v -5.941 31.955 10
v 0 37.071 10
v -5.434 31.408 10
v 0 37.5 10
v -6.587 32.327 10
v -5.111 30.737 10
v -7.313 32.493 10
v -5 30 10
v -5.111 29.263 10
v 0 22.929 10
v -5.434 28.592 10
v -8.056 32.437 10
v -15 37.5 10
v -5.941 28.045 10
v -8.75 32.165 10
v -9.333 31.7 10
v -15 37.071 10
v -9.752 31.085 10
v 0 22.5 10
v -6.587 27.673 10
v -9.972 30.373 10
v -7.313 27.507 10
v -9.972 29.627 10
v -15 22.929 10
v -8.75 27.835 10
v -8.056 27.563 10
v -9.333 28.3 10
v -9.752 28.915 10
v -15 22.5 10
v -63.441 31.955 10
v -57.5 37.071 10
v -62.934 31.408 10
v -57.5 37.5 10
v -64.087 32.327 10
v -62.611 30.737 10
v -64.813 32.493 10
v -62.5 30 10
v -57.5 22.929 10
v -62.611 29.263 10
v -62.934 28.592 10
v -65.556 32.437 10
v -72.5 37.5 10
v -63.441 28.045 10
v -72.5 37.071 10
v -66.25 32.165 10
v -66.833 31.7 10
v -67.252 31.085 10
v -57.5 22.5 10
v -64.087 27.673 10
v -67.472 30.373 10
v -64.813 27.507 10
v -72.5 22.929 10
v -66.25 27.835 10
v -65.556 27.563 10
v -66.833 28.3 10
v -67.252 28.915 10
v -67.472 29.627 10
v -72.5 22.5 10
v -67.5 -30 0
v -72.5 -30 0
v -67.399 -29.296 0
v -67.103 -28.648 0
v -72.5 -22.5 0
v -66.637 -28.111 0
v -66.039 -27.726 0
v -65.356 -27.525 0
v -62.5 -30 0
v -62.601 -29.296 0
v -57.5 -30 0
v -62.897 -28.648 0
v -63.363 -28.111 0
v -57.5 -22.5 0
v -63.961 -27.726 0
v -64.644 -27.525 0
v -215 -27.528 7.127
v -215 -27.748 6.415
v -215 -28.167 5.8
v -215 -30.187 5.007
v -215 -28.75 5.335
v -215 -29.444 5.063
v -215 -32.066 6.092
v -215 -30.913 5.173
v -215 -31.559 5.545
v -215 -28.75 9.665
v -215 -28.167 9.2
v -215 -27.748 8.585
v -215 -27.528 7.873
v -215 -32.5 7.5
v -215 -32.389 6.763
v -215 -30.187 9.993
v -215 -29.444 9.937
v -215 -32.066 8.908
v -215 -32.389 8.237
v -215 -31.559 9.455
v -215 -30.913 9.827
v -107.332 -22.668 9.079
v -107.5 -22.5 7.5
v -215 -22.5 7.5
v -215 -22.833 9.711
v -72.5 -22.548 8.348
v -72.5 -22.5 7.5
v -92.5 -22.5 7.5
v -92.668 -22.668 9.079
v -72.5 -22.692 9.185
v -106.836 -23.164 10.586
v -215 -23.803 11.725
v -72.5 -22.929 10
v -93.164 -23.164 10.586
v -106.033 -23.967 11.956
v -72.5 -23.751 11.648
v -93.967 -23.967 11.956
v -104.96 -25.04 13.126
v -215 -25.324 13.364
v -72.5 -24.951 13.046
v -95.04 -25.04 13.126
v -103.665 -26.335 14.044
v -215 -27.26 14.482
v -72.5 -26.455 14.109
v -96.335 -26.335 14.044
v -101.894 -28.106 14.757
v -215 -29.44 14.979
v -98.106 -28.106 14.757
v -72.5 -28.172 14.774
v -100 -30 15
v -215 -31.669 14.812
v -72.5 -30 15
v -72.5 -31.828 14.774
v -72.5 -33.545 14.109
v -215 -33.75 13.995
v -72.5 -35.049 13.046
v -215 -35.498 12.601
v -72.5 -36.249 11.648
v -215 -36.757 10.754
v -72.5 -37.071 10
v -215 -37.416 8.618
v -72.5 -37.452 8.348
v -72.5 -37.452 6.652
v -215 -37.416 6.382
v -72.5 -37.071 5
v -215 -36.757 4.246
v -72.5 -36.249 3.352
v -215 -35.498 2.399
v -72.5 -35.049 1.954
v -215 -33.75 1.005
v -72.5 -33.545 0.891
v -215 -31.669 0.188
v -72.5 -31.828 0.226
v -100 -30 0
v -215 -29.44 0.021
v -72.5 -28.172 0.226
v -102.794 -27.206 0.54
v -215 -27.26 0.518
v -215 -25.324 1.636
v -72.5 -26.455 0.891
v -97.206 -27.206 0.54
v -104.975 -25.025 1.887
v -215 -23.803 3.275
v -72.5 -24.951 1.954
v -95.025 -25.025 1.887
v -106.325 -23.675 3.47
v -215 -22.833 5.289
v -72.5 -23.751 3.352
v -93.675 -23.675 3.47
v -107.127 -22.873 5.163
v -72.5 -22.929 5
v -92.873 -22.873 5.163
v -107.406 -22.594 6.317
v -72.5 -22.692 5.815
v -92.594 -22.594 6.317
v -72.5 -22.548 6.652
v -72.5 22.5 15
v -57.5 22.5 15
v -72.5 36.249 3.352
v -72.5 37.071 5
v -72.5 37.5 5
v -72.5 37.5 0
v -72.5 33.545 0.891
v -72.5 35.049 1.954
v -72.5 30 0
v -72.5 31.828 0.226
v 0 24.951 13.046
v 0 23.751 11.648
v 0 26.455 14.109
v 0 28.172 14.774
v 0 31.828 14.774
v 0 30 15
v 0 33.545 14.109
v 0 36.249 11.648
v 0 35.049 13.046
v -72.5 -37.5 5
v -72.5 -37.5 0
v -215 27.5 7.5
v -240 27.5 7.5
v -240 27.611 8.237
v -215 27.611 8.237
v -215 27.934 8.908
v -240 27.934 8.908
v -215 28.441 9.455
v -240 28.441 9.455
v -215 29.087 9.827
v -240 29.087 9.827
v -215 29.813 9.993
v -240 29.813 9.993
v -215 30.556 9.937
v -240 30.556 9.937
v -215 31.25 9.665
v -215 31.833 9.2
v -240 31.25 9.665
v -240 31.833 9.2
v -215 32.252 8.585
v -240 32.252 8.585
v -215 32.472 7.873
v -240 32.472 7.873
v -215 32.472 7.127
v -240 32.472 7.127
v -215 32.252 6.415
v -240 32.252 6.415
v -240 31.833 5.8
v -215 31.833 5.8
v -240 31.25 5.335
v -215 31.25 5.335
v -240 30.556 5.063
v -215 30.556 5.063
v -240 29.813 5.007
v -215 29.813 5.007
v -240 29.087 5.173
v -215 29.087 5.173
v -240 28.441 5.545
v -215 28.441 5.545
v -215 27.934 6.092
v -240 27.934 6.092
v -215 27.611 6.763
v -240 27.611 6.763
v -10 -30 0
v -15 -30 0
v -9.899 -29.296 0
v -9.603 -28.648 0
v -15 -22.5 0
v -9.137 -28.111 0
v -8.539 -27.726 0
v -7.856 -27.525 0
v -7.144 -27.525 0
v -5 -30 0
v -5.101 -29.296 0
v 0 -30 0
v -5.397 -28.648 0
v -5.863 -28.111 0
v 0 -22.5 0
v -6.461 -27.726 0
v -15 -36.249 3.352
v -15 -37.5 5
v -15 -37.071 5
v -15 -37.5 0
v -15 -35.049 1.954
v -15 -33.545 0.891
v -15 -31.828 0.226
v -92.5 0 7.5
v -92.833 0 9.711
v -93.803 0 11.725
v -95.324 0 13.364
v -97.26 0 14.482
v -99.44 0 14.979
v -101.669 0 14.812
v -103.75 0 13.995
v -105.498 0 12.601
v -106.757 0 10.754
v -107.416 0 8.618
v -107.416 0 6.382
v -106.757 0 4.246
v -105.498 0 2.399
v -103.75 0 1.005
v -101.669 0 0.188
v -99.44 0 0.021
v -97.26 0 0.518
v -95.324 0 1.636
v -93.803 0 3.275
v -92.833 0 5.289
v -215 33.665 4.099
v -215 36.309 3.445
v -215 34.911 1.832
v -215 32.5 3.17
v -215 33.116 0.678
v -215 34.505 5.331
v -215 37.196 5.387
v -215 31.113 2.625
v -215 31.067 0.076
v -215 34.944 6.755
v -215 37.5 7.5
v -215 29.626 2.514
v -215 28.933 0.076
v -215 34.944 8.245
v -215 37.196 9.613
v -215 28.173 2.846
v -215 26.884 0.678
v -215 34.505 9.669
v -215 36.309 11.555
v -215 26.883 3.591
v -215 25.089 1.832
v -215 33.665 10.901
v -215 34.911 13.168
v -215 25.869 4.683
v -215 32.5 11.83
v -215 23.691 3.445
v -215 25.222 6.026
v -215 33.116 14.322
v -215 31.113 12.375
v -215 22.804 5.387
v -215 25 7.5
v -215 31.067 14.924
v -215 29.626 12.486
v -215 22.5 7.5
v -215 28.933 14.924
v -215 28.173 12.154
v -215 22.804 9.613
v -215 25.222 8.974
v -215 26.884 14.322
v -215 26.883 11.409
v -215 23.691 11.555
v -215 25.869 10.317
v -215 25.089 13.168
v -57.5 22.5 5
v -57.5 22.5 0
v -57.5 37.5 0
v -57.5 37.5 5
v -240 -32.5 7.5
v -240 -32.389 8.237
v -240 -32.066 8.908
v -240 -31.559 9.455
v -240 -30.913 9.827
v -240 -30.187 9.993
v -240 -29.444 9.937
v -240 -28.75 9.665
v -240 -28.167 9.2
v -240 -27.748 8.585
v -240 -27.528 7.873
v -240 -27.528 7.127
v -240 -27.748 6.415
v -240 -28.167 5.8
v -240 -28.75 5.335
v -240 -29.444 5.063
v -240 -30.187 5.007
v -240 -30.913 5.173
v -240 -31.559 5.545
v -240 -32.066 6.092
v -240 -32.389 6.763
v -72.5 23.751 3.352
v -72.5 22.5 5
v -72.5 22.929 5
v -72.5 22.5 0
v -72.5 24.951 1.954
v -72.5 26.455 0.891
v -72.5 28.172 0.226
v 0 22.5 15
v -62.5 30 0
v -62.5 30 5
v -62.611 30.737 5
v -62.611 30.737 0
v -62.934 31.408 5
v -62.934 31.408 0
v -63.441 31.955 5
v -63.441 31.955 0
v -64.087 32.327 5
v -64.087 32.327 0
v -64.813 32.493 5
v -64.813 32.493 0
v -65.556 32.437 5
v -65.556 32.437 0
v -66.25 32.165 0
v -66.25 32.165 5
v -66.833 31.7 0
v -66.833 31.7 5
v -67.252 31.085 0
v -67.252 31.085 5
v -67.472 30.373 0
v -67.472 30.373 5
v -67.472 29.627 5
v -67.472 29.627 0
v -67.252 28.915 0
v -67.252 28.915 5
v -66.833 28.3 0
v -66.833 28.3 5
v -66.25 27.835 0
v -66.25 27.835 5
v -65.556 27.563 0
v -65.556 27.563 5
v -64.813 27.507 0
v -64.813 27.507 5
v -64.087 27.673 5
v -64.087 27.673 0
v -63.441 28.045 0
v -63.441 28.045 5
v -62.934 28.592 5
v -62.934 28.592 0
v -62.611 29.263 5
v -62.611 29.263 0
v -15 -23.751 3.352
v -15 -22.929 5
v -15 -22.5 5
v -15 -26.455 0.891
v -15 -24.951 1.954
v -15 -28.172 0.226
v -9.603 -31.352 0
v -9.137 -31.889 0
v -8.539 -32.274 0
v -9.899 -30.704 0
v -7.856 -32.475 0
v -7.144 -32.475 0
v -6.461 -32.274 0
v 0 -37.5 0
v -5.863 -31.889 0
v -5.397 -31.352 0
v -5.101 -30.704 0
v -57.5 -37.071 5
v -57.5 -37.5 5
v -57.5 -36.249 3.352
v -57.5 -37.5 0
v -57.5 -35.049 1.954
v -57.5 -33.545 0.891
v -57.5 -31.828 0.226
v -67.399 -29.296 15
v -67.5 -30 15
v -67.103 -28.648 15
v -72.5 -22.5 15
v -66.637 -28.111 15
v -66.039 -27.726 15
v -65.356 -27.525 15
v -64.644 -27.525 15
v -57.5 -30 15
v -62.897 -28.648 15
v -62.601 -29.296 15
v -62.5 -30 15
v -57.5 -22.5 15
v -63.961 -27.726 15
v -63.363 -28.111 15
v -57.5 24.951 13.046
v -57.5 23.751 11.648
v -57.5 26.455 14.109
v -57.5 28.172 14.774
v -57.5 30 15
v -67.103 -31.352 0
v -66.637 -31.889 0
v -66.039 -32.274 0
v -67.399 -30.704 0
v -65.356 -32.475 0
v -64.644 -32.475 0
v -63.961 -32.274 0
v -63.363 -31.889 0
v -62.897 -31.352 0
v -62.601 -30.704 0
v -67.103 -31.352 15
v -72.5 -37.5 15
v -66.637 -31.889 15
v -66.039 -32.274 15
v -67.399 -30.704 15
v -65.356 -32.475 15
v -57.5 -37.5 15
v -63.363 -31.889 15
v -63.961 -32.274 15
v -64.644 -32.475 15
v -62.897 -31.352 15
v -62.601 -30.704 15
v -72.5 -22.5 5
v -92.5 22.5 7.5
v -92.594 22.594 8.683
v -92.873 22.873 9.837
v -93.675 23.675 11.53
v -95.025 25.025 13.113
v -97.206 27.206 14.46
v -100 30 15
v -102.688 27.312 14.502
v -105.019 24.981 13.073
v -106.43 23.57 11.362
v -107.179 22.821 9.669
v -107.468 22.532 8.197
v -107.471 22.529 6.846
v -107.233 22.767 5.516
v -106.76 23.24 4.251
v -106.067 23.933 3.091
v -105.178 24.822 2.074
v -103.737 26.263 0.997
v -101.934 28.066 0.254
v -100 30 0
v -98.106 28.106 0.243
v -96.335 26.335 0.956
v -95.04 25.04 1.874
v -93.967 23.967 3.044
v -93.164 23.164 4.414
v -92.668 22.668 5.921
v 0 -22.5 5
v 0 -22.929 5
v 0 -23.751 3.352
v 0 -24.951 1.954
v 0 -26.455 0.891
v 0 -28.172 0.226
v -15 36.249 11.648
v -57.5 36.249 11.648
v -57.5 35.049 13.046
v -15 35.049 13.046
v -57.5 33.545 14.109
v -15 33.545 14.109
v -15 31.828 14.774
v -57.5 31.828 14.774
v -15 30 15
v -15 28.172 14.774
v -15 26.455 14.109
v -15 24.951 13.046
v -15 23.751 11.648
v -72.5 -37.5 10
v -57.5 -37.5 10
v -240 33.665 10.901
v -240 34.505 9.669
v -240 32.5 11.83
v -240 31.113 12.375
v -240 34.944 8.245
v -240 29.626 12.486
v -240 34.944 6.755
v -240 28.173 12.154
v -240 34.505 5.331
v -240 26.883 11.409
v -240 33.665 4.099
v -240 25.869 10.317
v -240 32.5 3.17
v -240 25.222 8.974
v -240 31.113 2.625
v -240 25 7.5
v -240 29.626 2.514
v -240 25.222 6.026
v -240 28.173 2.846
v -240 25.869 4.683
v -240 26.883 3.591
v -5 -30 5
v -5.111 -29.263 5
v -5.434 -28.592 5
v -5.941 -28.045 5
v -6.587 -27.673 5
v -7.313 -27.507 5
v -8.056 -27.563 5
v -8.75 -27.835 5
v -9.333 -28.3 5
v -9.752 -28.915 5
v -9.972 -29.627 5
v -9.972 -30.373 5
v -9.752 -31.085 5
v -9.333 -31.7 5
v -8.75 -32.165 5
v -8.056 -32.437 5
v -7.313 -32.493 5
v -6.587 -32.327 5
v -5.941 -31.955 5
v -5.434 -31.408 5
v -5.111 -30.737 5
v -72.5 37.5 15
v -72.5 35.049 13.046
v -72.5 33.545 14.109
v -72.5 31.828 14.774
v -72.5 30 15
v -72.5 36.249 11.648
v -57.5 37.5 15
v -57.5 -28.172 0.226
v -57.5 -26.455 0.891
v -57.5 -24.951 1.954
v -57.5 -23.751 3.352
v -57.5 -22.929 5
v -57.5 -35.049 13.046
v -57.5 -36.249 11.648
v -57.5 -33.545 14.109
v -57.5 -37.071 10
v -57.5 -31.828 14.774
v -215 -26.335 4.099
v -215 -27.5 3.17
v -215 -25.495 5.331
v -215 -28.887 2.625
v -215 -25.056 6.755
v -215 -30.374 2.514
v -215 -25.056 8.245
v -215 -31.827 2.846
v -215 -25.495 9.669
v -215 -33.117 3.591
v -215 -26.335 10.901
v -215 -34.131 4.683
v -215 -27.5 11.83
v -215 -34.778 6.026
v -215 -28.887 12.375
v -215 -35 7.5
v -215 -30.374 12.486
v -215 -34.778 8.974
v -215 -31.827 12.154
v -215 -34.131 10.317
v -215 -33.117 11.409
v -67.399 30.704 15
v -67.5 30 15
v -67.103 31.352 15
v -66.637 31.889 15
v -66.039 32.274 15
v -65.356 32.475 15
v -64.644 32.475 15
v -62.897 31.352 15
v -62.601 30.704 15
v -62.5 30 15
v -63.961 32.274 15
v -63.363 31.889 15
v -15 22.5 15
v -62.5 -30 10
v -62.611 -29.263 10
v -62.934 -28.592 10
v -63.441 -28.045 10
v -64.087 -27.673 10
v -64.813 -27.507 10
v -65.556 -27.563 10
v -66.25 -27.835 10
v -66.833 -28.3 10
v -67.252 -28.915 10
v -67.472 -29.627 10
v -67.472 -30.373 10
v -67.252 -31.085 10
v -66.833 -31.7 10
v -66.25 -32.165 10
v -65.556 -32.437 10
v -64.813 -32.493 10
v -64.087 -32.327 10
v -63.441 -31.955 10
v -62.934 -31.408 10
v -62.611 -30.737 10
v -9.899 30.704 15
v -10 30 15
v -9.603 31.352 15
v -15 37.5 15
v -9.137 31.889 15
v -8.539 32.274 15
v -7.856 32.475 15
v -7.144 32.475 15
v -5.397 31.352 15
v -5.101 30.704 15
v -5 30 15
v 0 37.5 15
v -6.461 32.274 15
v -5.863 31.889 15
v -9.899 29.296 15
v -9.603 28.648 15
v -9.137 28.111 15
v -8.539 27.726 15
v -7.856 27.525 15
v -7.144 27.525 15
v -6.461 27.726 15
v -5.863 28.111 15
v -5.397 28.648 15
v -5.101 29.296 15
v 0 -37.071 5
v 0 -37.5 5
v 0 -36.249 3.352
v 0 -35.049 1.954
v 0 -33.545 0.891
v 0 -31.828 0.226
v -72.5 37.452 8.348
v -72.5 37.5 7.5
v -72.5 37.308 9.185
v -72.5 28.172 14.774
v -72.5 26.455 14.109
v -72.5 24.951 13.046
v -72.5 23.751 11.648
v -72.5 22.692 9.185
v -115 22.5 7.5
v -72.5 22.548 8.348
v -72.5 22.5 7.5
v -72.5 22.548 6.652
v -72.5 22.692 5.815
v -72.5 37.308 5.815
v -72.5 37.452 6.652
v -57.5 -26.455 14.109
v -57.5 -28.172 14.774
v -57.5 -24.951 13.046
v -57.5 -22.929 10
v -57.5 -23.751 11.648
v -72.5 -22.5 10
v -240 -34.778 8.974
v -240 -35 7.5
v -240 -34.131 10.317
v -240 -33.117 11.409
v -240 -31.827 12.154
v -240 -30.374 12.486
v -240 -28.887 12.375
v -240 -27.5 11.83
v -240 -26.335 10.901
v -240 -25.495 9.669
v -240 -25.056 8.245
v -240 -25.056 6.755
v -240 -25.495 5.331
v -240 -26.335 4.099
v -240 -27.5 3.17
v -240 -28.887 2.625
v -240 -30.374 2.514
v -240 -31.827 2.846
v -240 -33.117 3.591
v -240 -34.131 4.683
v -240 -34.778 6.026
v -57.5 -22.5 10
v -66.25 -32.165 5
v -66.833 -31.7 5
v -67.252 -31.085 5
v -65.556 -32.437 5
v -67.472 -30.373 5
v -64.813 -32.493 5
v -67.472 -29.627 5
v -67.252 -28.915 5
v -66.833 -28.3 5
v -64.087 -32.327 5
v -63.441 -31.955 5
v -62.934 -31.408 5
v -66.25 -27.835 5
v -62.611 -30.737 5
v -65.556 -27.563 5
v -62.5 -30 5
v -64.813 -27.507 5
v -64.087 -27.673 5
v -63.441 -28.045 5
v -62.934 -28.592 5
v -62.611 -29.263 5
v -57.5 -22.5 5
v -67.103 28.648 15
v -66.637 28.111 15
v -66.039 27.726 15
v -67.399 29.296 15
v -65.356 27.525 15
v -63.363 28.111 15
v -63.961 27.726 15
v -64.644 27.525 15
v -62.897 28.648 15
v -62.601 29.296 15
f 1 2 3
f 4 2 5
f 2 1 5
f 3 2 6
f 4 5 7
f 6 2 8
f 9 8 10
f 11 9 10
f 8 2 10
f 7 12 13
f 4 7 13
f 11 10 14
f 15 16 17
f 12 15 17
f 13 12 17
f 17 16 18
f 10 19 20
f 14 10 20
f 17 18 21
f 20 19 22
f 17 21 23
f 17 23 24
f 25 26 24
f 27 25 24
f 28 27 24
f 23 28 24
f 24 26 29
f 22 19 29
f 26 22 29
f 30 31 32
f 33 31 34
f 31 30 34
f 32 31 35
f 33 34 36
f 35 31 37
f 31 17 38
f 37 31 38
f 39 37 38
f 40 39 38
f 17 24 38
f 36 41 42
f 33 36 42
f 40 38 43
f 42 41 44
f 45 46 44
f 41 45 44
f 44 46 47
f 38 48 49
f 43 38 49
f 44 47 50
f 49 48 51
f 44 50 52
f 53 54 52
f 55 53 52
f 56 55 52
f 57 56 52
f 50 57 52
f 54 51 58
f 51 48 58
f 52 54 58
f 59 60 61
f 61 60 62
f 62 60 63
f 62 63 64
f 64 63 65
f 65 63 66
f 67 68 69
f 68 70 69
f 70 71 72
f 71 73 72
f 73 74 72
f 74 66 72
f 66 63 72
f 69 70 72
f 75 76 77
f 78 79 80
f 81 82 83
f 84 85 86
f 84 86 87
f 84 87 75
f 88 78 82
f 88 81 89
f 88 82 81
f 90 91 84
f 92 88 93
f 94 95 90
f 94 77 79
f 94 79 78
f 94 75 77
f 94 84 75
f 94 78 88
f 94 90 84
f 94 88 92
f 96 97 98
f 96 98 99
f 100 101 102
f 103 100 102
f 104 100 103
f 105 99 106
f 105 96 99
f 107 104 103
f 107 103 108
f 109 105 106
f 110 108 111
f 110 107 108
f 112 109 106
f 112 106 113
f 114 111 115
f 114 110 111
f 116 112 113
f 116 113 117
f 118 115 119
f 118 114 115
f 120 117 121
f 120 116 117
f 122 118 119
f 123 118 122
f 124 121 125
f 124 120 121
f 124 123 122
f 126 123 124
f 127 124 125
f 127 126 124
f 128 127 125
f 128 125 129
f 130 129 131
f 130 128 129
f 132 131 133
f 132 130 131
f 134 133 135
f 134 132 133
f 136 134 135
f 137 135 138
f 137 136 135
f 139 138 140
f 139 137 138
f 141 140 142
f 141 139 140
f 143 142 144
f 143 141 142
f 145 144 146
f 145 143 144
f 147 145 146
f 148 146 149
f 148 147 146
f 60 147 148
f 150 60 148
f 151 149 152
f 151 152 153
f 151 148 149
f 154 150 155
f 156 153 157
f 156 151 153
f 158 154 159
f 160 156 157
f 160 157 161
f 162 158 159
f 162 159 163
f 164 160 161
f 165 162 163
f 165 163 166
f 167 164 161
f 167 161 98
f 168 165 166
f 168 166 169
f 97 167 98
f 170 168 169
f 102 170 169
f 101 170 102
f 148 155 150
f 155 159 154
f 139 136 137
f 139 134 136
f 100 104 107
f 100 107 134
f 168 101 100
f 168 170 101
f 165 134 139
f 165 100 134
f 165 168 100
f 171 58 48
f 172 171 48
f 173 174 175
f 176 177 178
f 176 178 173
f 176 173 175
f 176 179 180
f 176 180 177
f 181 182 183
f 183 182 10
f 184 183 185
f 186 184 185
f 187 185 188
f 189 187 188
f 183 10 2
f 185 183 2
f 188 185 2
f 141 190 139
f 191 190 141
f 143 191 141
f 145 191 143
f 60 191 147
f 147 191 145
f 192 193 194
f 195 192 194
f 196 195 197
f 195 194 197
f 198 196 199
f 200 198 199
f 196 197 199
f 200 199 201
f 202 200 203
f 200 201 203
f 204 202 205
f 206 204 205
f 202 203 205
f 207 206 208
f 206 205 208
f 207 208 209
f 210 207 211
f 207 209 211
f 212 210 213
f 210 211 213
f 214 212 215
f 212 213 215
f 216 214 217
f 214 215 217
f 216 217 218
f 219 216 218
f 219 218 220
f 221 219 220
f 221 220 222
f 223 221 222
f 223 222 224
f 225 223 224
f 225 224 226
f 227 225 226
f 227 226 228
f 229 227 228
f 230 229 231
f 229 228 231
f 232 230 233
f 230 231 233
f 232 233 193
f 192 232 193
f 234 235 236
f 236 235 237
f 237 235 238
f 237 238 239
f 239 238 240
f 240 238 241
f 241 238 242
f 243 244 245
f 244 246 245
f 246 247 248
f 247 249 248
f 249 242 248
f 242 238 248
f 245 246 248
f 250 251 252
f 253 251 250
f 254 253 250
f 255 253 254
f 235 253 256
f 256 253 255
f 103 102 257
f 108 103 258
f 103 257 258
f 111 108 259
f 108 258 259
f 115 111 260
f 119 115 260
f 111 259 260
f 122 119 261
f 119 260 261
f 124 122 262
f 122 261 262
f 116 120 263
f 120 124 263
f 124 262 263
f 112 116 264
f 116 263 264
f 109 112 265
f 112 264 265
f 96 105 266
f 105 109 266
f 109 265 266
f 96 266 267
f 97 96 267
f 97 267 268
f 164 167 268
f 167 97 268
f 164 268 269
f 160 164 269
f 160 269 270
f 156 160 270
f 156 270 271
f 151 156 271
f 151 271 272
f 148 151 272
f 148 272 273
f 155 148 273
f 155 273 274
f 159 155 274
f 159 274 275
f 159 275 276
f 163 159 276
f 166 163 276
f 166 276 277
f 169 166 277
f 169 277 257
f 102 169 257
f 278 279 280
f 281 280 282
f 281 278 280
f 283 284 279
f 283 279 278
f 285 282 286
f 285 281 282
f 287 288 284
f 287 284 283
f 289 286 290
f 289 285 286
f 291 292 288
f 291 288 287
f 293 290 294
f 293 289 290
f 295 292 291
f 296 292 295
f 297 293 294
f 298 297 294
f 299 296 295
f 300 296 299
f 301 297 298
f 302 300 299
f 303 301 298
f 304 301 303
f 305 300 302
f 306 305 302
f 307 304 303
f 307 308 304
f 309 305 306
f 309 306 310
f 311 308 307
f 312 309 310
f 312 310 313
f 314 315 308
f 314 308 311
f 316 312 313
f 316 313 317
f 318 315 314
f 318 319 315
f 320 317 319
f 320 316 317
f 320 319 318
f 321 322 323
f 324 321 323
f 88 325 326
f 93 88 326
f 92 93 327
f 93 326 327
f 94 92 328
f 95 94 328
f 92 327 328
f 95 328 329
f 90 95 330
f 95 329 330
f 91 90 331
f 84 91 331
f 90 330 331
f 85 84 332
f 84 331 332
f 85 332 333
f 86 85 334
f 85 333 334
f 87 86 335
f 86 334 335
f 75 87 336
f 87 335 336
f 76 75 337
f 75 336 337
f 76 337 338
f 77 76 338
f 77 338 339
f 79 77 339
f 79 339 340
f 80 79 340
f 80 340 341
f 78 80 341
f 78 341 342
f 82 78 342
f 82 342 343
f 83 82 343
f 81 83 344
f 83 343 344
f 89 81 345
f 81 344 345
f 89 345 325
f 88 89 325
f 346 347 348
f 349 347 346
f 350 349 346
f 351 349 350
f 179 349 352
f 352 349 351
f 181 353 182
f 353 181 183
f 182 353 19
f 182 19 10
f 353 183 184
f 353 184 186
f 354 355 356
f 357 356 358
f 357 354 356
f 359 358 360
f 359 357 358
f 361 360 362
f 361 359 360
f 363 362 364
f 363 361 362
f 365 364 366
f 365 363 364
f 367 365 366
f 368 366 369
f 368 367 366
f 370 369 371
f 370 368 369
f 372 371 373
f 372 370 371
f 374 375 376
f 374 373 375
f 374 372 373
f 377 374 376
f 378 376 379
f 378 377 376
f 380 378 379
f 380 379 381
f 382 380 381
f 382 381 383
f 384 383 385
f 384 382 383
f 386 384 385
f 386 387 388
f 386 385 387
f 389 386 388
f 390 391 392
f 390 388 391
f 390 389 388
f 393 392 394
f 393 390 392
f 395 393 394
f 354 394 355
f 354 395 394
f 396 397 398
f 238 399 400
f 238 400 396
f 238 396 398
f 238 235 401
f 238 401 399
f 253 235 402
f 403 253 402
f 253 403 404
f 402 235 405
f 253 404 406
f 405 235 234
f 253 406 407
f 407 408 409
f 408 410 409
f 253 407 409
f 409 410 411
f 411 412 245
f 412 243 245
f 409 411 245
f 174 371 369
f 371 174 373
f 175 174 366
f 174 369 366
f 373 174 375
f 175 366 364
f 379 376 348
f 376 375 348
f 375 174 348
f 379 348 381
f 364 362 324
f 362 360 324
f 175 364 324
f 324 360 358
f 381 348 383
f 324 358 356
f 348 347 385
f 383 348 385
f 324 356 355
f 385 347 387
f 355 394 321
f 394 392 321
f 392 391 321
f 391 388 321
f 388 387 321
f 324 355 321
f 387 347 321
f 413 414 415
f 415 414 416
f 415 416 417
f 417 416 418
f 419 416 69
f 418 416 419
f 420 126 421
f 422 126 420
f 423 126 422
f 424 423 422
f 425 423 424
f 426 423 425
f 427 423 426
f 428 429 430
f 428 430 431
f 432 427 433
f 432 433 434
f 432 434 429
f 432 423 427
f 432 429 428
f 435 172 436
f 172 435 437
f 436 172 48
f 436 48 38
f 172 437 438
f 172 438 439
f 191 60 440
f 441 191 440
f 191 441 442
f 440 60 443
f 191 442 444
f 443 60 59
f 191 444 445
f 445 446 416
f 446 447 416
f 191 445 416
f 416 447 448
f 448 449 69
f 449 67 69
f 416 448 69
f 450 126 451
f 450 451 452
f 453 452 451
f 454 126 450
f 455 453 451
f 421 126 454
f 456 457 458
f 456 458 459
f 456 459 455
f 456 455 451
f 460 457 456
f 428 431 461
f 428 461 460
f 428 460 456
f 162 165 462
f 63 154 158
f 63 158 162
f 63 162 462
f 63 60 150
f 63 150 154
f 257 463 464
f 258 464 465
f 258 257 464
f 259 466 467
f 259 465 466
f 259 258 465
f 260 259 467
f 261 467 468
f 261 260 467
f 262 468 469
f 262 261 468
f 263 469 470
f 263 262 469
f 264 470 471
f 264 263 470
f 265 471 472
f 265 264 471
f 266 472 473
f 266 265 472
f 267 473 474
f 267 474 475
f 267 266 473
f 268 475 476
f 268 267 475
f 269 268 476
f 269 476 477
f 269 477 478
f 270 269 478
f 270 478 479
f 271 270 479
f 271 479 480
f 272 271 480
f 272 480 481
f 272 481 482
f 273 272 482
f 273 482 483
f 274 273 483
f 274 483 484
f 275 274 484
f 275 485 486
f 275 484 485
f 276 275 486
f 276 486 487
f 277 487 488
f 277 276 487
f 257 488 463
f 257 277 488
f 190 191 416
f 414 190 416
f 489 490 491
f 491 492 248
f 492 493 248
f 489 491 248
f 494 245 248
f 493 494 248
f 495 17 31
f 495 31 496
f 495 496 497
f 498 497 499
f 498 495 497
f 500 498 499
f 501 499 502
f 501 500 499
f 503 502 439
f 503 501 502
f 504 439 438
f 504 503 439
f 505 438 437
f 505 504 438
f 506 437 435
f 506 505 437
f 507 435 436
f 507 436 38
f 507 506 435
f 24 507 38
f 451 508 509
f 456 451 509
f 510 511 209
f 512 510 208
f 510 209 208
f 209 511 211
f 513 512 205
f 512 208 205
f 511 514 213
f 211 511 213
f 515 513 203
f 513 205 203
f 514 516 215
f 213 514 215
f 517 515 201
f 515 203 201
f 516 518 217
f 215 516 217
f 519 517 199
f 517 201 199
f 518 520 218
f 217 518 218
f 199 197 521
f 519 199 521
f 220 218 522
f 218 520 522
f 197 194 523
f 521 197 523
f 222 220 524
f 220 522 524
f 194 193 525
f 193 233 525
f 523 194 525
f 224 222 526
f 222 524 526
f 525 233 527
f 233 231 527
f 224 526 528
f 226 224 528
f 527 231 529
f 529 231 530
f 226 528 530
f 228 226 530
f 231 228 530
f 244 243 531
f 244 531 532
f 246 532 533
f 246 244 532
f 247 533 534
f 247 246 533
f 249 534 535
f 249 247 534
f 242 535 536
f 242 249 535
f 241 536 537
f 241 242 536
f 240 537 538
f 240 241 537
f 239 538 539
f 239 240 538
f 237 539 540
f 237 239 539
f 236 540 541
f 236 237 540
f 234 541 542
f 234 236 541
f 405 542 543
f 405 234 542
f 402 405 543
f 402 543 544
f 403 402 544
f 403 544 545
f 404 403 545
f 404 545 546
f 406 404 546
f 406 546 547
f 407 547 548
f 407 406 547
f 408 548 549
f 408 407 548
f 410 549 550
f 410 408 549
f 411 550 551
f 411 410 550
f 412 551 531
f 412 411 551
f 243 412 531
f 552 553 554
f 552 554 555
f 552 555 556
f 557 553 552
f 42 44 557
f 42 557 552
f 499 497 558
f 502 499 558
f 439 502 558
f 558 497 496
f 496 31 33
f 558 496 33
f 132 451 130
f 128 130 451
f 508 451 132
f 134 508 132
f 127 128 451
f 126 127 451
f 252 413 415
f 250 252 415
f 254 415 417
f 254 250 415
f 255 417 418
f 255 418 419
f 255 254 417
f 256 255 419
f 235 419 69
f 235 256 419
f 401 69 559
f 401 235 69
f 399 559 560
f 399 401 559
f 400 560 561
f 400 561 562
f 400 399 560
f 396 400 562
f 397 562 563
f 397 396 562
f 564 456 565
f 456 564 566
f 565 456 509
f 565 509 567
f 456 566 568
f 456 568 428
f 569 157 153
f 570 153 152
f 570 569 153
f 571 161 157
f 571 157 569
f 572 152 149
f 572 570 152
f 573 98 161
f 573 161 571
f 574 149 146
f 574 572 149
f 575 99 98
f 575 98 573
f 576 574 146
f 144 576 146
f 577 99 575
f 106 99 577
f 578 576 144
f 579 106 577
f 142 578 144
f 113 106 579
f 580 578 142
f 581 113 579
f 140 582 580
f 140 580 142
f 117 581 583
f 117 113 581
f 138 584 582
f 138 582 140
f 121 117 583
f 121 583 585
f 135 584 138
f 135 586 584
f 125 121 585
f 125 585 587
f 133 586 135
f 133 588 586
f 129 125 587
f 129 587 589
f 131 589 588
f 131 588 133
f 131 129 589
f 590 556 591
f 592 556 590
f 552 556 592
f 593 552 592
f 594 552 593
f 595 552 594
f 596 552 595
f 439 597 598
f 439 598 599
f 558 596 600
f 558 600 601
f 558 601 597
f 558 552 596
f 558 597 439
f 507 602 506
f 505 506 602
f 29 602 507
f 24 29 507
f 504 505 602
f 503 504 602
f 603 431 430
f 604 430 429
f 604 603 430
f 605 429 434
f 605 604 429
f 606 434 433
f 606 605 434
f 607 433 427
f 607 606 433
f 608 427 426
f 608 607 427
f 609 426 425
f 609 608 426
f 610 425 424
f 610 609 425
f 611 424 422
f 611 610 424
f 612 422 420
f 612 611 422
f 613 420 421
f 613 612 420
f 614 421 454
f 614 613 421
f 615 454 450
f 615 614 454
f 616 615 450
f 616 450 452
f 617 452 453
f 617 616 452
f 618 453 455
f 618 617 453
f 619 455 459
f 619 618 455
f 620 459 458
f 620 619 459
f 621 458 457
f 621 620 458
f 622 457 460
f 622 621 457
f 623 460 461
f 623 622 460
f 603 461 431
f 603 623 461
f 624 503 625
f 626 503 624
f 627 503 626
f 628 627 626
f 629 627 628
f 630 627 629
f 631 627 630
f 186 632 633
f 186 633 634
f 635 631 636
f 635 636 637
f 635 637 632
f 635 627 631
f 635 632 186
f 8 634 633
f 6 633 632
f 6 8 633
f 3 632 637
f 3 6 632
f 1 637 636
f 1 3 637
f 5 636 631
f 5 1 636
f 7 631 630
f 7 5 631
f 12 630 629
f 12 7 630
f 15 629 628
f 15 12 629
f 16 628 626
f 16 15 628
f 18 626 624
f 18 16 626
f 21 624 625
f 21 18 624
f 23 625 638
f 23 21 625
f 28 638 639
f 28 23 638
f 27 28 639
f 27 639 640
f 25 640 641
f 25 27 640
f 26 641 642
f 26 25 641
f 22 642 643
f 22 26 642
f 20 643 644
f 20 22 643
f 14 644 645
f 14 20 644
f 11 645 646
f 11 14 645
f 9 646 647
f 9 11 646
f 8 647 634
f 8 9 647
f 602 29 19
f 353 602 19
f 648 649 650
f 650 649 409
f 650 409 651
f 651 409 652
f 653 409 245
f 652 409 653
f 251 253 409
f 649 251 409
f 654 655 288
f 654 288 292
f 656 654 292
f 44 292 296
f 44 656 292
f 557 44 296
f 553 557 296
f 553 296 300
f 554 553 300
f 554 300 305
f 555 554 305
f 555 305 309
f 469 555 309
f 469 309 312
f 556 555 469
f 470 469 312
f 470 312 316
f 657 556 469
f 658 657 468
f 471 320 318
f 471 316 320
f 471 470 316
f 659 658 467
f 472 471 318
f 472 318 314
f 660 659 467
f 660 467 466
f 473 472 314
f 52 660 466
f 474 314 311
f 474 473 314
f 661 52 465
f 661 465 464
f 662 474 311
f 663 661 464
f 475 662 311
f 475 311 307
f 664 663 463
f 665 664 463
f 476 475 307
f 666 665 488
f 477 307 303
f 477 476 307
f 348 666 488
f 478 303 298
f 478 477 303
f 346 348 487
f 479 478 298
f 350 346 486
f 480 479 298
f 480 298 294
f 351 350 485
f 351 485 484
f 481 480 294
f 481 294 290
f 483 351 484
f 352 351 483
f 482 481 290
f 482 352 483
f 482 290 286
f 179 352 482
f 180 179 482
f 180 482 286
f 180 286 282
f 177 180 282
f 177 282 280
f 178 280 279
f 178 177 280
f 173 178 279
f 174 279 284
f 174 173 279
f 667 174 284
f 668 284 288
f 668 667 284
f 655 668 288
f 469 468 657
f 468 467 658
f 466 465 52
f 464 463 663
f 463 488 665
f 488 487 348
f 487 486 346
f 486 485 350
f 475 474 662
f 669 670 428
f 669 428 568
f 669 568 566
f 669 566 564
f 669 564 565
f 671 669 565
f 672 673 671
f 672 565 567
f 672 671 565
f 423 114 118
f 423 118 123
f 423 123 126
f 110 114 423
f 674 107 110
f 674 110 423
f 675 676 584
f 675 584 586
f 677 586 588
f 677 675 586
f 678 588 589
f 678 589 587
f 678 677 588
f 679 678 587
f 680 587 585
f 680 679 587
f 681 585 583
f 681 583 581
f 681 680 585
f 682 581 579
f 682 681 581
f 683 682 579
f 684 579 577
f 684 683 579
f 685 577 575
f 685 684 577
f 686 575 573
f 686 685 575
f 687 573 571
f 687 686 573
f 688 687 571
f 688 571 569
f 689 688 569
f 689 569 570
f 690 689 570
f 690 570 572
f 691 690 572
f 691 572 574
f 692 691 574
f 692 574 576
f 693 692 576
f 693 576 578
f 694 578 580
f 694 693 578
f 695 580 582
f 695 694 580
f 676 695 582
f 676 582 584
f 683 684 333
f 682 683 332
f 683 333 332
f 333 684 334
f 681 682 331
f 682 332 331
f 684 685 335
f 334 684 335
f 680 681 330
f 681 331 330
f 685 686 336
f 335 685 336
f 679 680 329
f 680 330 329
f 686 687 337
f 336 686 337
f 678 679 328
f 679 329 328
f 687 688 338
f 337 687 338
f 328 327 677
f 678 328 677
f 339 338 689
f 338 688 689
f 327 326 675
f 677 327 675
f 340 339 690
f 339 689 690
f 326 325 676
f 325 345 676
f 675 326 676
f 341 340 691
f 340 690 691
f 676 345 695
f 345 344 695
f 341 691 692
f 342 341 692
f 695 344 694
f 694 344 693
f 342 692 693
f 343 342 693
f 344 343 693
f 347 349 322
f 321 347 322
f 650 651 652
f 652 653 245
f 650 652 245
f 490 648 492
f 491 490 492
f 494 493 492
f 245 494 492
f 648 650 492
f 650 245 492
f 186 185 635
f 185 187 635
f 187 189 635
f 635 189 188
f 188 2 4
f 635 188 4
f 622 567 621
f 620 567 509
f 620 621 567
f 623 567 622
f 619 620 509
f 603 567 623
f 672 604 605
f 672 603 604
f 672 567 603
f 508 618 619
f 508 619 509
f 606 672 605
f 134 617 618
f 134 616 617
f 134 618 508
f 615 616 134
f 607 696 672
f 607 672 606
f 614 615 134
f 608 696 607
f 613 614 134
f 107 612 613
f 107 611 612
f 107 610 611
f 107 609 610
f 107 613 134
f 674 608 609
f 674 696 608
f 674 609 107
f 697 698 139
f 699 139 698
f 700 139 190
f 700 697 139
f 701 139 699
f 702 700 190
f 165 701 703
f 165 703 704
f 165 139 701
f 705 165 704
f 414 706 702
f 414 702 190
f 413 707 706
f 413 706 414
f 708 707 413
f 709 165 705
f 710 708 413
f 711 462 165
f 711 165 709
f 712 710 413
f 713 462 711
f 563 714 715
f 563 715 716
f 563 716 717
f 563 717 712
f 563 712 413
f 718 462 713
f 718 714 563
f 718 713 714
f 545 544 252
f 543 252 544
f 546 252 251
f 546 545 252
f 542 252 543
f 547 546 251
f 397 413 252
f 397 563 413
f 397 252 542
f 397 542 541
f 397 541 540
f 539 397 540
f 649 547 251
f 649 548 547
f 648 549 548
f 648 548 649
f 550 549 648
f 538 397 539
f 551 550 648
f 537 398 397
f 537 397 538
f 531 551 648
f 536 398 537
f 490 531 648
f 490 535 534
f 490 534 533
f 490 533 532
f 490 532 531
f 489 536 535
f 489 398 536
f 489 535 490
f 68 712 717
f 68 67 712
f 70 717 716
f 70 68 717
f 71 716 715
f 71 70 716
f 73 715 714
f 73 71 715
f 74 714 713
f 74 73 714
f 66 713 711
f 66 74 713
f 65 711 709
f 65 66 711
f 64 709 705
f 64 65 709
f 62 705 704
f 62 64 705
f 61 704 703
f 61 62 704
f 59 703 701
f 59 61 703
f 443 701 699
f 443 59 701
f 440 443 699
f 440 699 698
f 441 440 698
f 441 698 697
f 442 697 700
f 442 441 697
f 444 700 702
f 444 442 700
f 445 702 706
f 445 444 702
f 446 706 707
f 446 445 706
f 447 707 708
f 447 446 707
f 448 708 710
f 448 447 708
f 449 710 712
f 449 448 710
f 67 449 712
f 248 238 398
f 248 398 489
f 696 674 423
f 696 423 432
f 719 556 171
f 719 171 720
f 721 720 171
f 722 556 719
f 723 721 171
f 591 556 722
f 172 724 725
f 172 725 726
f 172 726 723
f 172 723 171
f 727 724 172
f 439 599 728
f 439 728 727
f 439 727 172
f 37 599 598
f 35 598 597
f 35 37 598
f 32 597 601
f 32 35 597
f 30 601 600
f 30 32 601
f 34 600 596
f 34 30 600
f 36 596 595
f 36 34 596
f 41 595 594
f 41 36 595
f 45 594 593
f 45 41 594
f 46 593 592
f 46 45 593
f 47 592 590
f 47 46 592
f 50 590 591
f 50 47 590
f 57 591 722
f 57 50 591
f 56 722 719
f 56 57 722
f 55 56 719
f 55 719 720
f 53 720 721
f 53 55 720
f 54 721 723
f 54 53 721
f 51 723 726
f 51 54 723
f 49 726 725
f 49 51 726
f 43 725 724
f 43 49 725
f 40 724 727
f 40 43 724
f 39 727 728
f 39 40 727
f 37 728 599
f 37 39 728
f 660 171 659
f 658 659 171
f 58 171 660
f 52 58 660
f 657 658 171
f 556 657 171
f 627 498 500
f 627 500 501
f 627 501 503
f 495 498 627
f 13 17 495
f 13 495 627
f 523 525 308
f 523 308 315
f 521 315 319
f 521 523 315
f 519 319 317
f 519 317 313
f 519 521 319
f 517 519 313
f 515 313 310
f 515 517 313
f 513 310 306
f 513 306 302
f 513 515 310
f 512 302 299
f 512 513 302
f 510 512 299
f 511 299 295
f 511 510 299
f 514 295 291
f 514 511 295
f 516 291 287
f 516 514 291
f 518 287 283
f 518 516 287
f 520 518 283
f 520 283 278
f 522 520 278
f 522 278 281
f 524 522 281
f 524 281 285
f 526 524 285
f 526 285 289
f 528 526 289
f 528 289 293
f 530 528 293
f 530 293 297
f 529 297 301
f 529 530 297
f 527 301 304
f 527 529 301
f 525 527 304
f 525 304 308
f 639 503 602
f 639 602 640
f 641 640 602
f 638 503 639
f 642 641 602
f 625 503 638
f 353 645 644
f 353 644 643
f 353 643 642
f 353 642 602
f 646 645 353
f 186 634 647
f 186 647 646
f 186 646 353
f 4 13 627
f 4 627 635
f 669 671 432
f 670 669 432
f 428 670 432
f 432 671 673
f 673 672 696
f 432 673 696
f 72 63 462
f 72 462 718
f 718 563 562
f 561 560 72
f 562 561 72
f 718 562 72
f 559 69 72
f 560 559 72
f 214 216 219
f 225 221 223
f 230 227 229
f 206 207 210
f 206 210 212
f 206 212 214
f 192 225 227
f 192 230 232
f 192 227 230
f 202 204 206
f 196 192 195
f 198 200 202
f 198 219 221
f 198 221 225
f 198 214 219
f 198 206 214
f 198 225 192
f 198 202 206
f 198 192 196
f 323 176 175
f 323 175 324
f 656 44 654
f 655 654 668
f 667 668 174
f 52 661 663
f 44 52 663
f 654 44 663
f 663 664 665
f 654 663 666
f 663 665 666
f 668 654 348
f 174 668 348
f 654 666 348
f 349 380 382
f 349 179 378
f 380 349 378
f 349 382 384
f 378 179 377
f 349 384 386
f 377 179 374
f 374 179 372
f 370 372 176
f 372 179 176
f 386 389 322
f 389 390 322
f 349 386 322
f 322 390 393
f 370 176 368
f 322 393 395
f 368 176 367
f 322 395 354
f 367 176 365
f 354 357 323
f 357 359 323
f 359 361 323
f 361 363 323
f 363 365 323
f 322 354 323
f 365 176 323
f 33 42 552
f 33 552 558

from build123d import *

# Parameters (mm, degrees)
F1_DEPTH      = 15
F2_R          = 7.5
F3_DEPTH      = 240
F4_R          = 7.5
F5_DEPTH      = 30
F5_DEPTH_BACK = 30
F6_W          = 15
F6_H          = 15
F7_DEPTH      = 15
F9_DEPTH      = 40.1
F11_DEPTH     = 54.1
F12_R         = 2.5
F13_DEPTH     = 25
F15_R         = 2.5
F16_DEPTH     = 25
F17_R         = 7.5
F17_R_2       = 5
F18_DEPTH     = 25


with BuildPart() as f1:
    # F0 (on Top) → F1 (new body)
    with BuildSketch(Plane.XY):
        Polygon((-240, -22.5), (-240, -37.5), (0, -37.5), (0, -22.5), (-100, -22.5), (-100, 22.5), (0, 22.5), (0, 37.5), (-240, 37.5), (-240, 22.5), (-115, 22.5), (-115, -22.5), align=None)
    extrude(amount=F1_DEPTH)

    # F2 (on Right) → F3 (intersect)
    with BuildSketch(Plane.YZ):
        with Locations((-30, 7.5)):
            Circle(F2_R)
        with Locations((30, 7.5)):
            Circle(F2_R)
    extrude(amount=-F3_DEPTH, mode=Mode.INTERSECT)

    # F4 (on Front) → F5 (join, two sides)
    with BuildSketch(Plane.XZ) as f5_sk:
        with Locations((-100, 7.5)):
            Circle(F4_R)
    extrude(amount=F5_DEPTH)
    extrude(f5_sk.sketch, amount=-F5_DEPTH_BACK)

    # F6 (on Top) → F7 (join)
    with BuildSketch(Plane.XY):
        with Locations((-65, 30)):
            Rectangle(F6_W, F6_H)
        with Locations((-65, -30)):
            Rectangle(F6_W, F6_H)
        with Locations((-7.5, 30)):
            Rectangle(F6_W, F6_H)
        with Locations((-7.5, -30)):
            Rectangle(F6_W, F6_H)
    extrude(amount=F7_DEPTH)

    # F8 (on Front) → F9 (cut)
    with BuildSketch(Plane.XZ):
        Polygon((0, 0), (0, 10), (-72.5, 10), (-72.5, 5), (-57.5, 5), (-57.5, 0), align=None)
    extrude(amount=-F9_DEPTH, mode=Mode.SUBTRACT)

    # F10 (on Front) → F11 (cut)
    with BuildSketch(Plane.XZ):
        Polygon((0, 5), (0, 15), (-57.5, 15), (-57.5, 10), (-72.5, 10), (-72.5, 5), (-57.5, 5), align=None)
    extrude(amount=F11_DEPTH, mode=Mode.SUBTRACT)

    # F12 (on Top) → F13 (cut)
    with BuildSketch(Plane.XY):
        with Locations((-65, 30)):
            Circle(F12_R)
        with Locations((-65, -30)):
            Circle(F12_R)
        with Locations((-7.5, -30)):
            Circle(F12_R)
        with Locations((-7.5, 30)):
            Circle(F12_R)
    extrude(amount=F13_DEPTH, mode=Mode.SUBTRACT)

    # F15 (on offset) → F16 (cut)
    with BuildSketch(Plane(origin=(-240, 0, 0), x_dir=(0, -1, 0), z_dir=(-1, 0, 0))):
        with Locations((30, 7.5)):
            Circle(F15_R)
        with Locations((-30, 7.5)):
            Circle(F15_R)
    extrude(amount=-F16_DEPTH, mode=Mode.SUBTRACT)

    # F17 (on offset) → F18 (cut)
    with BuildSketch(Plane(origin=(-240, 0, 0), x_dir=(0, -1, 0), z_dir=(-1, 0, 0))):
        with Locations((30, 7.5)):
            Circle(F17_R)
        with Locations((30, 7.5)):
            Circle(F17_R_2, mode=Mode.SUBTRACT)
        with Locations((-30, 7.5)):
            Circle(F17_R)
        with Locations((-30, 7.5)):
            Circle(F17_R_2, mode=Mode.SUBTRACT)
    extrude(amount=-F18_DEPTH, mode=Mode.SUBTRACT)


solid = f1.part
